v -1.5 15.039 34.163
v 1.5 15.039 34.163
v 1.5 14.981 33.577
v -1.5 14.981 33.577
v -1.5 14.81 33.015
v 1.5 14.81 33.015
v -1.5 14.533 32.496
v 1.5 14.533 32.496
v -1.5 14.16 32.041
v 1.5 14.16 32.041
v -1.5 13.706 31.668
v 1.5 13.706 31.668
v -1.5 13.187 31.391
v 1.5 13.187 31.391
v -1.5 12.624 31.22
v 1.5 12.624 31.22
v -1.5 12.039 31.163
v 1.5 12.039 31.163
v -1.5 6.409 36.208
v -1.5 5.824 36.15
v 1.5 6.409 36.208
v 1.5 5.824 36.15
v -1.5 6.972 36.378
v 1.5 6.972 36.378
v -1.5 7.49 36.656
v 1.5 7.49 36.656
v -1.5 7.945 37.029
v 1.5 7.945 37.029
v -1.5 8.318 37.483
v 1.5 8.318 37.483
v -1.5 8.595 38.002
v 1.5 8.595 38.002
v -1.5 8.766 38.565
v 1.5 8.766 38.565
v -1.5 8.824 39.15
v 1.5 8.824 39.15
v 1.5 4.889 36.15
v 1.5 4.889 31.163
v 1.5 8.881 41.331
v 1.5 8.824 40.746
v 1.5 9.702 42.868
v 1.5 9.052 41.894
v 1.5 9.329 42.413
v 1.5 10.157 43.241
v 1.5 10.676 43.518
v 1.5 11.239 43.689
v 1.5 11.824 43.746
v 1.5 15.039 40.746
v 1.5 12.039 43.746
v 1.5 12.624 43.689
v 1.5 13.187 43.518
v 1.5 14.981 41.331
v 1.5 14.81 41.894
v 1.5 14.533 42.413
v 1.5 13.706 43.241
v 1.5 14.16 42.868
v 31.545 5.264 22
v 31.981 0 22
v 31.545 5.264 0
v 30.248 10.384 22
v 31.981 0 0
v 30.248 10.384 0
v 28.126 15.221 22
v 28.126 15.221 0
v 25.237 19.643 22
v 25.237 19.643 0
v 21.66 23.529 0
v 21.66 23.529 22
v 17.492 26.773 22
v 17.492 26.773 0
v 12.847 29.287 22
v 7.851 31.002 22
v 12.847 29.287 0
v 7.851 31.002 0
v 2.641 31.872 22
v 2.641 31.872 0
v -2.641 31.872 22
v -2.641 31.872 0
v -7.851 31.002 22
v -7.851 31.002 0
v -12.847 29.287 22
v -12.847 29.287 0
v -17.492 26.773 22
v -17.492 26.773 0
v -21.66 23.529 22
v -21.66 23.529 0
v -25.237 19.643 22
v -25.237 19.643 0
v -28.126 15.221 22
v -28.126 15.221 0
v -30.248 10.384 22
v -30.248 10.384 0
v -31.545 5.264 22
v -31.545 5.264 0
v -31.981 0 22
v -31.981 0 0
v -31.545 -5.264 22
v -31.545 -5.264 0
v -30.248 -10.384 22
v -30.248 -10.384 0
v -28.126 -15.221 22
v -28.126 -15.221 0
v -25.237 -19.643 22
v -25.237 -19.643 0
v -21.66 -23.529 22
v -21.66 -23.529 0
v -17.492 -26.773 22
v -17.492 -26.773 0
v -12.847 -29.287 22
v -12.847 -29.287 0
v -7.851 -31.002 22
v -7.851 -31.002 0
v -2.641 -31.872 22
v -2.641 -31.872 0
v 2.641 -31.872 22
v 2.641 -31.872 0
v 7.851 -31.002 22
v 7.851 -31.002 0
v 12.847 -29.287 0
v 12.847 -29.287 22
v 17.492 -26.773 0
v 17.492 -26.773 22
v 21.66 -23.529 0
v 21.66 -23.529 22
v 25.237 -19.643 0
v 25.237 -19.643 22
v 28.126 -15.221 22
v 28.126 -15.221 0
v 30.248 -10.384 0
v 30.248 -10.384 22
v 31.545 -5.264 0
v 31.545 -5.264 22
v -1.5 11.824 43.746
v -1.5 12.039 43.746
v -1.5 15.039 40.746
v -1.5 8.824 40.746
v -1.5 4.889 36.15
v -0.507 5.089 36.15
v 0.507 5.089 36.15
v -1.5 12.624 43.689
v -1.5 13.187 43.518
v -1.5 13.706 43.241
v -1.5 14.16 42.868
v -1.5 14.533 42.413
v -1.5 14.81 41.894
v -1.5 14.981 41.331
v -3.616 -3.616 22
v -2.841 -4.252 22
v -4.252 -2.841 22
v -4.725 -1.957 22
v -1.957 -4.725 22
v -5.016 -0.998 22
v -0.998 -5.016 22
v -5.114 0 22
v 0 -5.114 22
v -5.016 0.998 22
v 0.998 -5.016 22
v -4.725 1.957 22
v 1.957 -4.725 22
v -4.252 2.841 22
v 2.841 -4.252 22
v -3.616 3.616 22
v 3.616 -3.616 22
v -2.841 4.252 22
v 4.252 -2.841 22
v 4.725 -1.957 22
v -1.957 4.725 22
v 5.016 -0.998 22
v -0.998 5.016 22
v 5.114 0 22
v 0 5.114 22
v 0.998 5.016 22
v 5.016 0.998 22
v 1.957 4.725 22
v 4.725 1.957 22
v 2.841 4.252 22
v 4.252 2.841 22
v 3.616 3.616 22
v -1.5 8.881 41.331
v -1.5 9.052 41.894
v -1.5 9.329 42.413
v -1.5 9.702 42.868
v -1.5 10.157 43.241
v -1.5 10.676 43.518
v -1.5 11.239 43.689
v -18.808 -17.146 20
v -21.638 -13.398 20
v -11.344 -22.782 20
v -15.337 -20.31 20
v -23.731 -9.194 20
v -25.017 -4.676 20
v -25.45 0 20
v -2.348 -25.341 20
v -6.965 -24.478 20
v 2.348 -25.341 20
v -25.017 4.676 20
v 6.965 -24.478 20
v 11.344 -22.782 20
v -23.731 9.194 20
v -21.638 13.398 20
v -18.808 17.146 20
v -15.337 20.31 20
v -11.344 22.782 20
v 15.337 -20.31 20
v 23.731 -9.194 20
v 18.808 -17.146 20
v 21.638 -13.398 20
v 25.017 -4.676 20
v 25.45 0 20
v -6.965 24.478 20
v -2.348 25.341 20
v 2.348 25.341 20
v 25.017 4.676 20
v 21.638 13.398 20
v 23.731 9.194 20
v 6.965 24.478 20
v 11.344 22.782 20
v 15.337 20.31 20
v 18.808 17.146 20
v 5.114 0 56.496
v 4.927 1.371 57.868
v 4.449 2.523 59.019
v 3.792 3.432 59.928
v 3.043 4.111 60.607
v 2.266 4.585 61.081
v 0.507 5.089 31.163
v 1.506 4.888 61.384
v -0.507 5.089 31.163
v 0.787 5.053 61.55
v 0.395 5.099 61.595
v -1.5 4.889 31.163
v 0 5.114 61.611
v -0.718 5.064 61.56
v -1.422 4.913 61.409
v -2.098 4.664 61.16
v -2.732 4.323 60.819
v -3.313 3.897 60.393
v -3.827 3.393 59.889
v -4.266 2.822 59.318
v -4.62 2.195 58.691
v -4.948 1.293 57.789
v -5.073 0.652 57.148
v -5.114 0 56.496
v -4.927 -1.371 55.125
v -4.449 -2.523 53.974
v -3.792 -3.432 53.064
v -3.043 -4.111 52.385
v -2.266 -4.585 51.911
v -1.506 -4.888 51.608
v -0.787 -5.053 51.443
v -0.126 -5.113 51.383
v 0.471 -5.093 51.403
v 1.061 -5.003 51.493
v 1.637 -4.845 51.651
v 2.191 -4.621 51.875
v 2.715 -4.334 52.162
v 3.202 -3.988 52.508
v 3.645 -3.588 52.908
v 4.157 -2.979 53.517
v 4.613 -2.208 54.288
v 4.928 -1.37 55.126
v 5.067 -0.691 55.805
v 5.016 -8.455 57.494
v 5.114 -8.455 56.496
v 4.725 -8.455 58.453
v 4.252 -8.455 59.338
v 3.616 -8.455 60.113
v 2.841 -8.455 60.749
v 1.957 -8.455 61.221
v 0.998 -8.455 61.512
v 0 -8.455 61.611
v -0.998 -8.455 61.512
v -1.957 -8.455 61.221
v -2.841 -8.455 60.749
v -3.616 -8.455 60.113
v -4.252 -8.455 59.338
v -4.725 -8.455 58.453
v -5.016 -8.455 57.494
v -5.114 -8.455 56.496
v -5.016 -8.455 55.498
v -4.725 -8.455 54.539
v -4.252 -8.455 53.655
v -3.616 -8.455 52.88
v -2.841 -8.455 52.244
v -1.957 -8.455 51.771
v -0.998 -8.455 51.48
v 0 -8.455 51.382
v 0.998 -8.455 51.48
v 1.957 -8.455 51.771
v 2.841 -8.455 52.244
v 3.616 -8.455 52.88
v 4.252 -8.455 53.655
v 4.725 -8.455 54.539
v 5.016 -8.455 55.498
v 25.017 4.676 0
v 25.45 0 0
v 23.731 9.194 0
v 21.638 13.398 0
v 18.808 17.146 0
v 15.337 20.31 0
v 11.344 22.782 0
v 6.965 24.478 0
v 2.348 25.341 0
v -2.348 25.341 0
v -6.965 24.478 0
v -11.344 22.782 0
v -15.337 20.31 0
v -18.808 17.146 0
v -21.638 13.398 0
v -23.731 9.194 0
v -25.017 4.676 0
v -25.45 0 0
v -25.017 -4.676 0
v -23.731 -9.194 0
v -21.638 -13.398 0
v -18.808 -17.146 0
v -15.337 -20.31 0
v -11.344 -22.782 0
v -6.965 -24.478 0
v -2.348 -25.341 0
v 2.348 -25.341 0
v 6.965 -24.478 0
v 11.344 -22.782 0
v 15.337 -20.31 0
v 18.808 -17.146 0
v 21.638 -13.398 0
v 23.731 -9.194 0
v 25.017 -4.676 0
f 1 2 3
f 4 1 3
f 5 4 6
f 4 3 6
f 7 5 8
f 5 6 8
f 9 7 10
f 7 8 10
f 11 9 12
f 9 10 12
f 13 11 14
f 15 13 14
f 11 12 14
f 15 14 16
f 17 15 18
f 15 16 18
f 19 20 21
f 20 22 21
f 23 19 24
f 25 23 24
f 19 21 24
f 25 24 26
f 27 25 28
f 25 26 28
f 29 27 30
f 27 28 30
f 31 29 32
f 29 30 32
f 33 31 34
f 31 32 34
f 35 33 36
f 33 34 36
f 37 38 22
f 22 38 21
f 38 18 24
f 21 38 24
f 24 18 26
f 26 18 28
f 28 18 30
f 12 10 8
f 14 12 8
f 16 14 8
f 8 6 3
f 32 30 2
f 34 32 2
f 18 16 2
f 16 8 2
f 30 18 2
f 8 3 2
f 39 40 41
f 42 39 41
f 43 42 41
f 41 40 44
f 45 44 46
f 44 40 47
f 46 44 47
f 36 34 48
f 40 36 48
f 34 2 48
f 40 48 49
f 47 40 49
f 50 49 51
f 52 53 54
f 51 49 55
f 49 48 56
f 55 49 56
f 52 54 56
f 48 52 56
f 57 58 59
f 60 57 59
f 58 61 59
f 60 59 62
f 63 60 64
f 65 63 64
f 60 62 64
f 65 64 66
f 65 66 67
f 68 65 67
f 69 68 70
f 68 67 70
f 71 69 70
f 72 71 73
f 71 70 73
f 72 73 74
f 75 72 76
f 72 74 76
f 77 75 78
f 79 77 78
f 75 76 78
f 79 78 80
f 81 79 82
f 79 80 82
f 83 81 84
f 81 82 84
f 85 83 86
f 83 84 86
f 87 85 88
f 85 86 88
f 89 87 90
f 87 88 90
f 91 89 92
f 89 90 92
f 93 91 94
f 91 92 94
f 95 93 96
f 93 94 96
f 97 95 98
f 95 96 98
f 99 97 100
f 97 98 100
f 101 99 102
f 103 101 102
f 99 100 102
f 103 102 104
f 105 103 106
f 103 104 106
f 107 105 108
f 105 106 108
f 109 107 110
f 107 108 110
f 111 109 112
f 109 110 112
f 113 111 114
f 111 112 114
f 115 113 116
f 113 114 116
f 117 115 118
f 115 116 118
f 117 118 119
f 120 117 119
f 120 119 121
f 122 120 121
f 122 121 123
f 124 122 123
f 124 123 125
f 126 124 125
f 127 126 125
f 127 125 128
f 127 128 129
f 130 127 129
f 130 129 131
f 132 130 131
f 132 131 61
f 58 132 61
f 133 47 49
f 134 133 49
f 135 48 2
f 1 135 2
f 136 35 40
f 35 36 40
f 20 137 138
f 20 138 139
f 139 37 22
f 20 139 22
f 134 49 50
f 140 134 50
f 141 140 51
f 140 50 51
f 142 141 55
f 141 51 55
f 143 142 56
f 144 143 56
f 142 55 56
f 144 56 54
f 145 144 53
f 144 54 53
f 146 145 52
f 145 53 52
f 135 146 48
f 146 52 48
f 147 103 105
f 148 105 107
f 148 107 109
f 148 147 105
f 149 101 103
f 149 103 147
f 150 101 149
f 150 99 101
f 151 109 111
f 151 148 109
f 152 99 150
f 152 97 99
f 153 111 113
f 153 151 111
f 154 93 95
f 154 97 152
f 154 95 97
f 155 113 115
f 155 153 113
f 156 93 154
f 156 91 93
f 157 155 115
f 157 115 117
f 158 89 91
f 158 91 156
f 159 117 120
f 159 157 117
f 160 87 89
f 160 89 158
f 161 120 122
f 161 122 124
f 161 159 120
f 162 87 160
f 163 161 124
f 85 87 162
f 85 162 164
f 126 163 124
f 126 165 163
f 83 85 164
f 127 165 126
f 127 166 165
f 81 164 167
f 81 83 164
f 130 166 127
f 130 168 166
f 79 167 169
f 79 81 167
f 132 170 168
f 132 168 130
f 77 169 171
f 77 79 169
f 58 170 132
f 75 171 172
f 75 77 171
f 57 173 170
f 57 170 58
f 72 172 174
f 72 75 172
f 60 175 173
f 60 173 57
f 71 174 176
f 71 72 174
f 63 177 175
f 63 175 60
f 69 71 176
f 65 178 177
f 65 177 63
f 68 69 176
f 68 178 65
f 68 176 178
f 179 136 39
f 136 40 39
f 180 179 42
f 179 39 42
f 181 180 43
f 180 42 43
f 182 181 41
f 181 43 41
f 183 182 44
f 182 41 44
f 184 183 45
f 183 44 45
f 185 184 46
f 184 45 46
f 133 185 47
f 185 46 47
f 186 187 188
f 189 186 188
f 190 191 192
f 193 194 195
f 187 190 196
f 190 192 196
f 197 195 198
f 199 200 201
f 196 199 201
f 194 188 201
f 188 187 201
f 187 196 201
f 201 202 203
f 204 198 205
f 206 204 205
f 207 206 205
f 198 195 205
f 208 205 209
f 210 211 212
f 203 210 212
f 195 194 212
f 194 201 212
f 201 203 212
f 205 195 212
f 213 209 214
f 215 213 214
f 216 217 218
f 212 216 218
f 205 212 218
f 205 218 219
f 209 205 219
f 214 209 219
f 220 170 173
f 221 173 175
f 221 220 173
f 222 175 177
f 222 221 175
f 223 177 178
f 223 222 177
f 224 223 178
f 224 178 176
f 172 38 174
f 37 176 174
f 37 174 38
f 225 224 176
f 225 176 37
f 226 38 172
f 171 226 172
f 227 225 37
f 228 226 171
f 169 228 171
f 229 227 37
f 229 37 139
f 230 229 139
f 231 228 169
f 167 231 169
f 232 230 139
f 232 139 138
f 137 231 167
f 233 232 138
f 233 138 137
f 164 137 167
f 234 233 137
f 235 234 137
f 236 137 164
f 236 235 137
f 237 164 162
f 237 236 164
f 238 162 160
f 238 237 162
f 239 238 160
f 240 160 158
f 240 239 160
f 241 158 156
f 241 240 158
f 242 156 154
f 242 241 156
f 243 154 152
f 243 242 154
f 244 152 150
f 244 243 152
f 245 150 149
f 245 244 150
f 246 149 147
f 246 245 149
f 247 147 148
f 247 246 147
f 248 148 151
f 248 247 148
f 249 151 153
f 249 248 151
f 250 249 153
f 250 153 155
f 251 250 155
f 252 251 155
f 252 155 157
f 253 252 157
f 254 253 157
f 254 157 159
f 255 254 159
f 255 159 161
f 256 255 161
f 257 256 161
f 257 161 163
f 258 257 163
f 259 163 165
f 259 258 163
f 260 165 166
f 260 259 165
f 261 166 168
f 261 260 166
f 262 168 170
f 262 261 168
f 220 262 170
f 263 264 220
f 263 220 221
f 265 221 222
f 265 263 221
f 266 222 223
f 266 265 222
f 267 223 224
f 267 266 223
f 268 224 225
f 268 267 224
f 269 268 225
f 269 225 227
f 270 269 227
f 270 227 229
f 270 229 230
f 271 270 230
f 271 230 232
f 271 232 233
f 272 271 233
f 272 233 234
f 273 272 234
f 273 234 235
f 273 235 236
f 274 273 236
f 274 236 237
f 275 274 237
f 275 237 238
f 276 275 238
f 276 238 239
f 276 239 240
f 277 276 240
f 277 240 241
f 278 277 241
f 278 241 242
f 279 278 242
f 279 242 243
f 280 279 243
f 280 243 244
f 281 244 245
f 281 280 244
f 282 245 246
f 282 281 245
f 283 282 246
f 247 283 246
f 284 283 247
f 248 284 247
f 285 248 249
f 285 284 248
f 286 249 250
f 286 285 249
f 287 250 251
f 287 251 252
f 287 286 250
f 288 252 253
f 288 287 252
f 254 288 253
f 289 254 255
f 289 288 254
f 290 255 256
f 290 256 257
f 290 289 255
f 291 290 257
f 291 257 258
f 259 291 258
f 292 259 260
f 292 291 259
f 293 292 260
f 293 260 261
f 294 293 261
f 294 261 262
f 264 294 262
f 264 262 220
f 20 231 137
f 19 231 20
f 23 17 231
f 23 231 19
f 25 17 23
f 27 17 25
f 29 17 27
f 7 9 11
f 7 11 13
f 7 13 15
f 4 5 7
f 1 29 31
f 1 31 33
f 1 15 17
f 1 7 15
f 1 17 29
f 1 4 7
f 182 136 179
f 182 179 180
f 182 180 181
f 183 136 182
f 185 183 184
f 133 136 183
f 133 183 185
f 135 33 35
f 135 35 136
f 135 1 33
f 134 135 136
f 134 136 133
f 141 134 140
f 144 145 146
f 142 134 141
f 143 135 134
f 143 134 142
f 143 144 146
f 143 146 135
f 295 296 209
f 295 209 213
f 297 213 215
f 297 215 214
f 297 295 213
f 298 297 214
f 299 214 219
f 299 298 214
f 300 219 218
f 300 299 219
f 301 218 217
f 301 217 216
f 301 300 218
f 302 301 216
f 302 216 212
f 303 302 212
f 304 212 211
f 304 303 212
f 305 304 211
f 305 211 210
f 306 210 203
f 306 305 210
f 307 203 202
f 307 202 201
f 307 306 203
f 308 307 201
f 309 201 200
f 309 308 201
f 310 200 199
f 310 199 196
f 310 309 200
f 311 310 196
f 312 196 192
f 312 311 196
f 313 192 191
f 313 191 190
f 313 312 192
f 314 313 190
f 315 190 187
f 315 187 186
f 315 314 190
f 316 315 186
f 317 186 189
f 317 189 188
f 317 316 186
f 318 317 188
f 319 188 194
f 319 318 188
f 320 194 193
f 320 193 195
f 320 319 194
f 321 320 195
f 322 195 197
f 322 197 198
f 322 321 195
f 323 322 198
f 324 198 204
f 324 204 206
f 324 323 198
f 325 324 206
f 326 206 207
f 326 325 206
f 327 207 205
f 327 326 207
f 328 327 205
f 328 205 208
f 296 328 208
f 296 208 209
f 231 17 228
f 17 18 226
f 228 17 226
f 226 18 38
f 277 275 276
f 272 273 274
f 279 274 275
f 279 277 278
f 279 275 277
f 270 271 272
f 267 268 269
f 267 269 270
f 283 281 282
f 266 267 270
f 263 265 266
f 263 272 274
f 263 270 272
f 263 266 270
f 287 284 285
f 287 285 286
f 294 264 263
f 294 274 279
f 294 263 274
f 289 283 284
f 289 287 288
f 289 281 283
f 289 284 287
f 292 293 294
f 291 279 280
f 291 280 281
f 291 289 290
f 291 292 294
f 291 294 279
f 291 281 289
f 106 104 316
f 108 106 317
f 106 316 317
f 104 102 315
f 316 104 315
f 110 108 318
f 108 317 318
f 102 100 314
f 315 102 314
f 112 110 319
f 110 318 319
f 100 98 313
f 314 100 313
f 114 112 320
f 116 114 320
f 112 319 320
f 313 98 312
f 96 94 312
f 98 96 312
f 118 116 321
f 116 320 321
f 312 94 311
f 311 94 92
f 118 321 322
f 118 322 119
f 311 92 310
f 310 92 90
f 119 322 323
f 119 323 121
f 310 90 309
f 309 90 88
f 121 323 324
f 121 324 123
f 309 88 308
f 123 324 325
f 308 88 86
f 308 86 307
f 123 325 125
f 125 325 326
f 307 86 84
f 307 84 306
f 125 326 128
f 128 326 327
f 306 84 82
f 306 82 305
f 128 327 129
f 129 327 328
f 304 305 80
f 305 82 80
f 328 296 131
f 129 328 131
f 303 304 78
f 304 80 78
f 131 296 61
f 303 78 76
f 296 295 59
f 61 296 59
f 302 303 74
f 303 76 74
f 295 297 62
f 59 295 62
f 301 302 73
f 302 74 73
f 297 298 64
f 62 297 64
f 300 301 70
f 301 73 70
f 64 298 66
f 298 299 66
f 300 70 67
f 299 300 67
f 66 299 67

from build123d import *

# Parameters (mm, degrees)
SKETCH1_R                = 31.980898523
SKETCH1_R_2              = 25.45
BOSS_EXTRUDE1_DEPTH      = 20
SKETCH2_R                = 31.980898523
BOSS_EXTRUDE2_DEPTH      = 2
SKETCH3_R                = 5.114403944
BOSS_EXTRUDE3_DEPTH      = 1.5
BOSS_EXTRUDE3_DEPTH_BACK = 1.5


with BuildPart() as part:
    # Sketch1 → Boss-Extrude1 (new body)
    with BuildSketch(Plane.XY):
        Circle(SKETCH1_R)
        Circle(SKETCH1_R_2, mode=Mode.SUBTRACT)
    extrude(amount=BOSS_EXTRUDE1_DEPTH)

    # Sketch2 → Boss-Extrude2 (add)
    with BuildSketch(Plane.XY.offset(20)):
        Circle(SKETCH2_R)
    extrude(amount=BOSS_EXTRUDE2_DEPTH)

    # Sweep2: sweep along a path in Sketch4
    with BuildLine(Plane(origin=(0, 0, 0), x_dir=(0, 0, -1), z_dir=(1, 0, 0))) as sweep2_path:
        Line((-22, 0), (-56.496170036, 0))
        Line((-56.496170036, 0), (-56.496170036, -8.454631323))
    # Sketch3 → Sweep2 (sweep)
    with BuildSketch(Plane.XY.offset(22)):
        Circle(SKETCH3_R)
    sweep(path=sweep2_path.line, transition=Transition.RIGHT)

    # Sketch5 → Boss-Extrude3 (add, two sides: drawn at the far end of the back side and taken through both)
    with BuildSketch(Plane(origin=(0, 0, 0), x_dir=(0, 0, -1), z_dir=(1, 0, 0)).offset(-BOSS_EXTRUDE3_DEPTH_BACK)):
        with BuildLine():
            Line((-36.150092228, 0), (-36.150092228, 5.823788286))
            ThreePointArc((-36.150092228, 5.823788286), (-37.028771884, 7.94510863), (-39.150092228, 8.823788286))
            Line((-39.150092228, 8.823788286), (-40.746223013, 8.823788286))
            ThreePointArc((-40.746223013, 8.823788286), (-42.867543357, 9.702467943), (-43.746223013, 11.823788286))
            Line((-43.746223013, 11.823788286), (-43.746223013, 12.038804384))
            ThreePointArc((-43.746223013, 12.038804384), (-42.867543357, 14.160124727), (-40.746223013, 15.038804384))
            Line((-40.746223013, 15.038804384), (-34.162733631, 15.038804384))
            ThreePointArc((-34.162733631, 15.038804384), (-32.041413287, 14.160124727), (-31.162733631, 12.038804384))
            Line((-31.162733631, 12.038804384), (-31.162733631, 0))
            Line((-31.162733631, 0), (-36.150092228, 0))
        make_face()
    extrude(amount=BOSS_EXTRUDE3_DEPTH + BOSS_EXTRUDE3_DEPTH_BACK)


solid = part.part
